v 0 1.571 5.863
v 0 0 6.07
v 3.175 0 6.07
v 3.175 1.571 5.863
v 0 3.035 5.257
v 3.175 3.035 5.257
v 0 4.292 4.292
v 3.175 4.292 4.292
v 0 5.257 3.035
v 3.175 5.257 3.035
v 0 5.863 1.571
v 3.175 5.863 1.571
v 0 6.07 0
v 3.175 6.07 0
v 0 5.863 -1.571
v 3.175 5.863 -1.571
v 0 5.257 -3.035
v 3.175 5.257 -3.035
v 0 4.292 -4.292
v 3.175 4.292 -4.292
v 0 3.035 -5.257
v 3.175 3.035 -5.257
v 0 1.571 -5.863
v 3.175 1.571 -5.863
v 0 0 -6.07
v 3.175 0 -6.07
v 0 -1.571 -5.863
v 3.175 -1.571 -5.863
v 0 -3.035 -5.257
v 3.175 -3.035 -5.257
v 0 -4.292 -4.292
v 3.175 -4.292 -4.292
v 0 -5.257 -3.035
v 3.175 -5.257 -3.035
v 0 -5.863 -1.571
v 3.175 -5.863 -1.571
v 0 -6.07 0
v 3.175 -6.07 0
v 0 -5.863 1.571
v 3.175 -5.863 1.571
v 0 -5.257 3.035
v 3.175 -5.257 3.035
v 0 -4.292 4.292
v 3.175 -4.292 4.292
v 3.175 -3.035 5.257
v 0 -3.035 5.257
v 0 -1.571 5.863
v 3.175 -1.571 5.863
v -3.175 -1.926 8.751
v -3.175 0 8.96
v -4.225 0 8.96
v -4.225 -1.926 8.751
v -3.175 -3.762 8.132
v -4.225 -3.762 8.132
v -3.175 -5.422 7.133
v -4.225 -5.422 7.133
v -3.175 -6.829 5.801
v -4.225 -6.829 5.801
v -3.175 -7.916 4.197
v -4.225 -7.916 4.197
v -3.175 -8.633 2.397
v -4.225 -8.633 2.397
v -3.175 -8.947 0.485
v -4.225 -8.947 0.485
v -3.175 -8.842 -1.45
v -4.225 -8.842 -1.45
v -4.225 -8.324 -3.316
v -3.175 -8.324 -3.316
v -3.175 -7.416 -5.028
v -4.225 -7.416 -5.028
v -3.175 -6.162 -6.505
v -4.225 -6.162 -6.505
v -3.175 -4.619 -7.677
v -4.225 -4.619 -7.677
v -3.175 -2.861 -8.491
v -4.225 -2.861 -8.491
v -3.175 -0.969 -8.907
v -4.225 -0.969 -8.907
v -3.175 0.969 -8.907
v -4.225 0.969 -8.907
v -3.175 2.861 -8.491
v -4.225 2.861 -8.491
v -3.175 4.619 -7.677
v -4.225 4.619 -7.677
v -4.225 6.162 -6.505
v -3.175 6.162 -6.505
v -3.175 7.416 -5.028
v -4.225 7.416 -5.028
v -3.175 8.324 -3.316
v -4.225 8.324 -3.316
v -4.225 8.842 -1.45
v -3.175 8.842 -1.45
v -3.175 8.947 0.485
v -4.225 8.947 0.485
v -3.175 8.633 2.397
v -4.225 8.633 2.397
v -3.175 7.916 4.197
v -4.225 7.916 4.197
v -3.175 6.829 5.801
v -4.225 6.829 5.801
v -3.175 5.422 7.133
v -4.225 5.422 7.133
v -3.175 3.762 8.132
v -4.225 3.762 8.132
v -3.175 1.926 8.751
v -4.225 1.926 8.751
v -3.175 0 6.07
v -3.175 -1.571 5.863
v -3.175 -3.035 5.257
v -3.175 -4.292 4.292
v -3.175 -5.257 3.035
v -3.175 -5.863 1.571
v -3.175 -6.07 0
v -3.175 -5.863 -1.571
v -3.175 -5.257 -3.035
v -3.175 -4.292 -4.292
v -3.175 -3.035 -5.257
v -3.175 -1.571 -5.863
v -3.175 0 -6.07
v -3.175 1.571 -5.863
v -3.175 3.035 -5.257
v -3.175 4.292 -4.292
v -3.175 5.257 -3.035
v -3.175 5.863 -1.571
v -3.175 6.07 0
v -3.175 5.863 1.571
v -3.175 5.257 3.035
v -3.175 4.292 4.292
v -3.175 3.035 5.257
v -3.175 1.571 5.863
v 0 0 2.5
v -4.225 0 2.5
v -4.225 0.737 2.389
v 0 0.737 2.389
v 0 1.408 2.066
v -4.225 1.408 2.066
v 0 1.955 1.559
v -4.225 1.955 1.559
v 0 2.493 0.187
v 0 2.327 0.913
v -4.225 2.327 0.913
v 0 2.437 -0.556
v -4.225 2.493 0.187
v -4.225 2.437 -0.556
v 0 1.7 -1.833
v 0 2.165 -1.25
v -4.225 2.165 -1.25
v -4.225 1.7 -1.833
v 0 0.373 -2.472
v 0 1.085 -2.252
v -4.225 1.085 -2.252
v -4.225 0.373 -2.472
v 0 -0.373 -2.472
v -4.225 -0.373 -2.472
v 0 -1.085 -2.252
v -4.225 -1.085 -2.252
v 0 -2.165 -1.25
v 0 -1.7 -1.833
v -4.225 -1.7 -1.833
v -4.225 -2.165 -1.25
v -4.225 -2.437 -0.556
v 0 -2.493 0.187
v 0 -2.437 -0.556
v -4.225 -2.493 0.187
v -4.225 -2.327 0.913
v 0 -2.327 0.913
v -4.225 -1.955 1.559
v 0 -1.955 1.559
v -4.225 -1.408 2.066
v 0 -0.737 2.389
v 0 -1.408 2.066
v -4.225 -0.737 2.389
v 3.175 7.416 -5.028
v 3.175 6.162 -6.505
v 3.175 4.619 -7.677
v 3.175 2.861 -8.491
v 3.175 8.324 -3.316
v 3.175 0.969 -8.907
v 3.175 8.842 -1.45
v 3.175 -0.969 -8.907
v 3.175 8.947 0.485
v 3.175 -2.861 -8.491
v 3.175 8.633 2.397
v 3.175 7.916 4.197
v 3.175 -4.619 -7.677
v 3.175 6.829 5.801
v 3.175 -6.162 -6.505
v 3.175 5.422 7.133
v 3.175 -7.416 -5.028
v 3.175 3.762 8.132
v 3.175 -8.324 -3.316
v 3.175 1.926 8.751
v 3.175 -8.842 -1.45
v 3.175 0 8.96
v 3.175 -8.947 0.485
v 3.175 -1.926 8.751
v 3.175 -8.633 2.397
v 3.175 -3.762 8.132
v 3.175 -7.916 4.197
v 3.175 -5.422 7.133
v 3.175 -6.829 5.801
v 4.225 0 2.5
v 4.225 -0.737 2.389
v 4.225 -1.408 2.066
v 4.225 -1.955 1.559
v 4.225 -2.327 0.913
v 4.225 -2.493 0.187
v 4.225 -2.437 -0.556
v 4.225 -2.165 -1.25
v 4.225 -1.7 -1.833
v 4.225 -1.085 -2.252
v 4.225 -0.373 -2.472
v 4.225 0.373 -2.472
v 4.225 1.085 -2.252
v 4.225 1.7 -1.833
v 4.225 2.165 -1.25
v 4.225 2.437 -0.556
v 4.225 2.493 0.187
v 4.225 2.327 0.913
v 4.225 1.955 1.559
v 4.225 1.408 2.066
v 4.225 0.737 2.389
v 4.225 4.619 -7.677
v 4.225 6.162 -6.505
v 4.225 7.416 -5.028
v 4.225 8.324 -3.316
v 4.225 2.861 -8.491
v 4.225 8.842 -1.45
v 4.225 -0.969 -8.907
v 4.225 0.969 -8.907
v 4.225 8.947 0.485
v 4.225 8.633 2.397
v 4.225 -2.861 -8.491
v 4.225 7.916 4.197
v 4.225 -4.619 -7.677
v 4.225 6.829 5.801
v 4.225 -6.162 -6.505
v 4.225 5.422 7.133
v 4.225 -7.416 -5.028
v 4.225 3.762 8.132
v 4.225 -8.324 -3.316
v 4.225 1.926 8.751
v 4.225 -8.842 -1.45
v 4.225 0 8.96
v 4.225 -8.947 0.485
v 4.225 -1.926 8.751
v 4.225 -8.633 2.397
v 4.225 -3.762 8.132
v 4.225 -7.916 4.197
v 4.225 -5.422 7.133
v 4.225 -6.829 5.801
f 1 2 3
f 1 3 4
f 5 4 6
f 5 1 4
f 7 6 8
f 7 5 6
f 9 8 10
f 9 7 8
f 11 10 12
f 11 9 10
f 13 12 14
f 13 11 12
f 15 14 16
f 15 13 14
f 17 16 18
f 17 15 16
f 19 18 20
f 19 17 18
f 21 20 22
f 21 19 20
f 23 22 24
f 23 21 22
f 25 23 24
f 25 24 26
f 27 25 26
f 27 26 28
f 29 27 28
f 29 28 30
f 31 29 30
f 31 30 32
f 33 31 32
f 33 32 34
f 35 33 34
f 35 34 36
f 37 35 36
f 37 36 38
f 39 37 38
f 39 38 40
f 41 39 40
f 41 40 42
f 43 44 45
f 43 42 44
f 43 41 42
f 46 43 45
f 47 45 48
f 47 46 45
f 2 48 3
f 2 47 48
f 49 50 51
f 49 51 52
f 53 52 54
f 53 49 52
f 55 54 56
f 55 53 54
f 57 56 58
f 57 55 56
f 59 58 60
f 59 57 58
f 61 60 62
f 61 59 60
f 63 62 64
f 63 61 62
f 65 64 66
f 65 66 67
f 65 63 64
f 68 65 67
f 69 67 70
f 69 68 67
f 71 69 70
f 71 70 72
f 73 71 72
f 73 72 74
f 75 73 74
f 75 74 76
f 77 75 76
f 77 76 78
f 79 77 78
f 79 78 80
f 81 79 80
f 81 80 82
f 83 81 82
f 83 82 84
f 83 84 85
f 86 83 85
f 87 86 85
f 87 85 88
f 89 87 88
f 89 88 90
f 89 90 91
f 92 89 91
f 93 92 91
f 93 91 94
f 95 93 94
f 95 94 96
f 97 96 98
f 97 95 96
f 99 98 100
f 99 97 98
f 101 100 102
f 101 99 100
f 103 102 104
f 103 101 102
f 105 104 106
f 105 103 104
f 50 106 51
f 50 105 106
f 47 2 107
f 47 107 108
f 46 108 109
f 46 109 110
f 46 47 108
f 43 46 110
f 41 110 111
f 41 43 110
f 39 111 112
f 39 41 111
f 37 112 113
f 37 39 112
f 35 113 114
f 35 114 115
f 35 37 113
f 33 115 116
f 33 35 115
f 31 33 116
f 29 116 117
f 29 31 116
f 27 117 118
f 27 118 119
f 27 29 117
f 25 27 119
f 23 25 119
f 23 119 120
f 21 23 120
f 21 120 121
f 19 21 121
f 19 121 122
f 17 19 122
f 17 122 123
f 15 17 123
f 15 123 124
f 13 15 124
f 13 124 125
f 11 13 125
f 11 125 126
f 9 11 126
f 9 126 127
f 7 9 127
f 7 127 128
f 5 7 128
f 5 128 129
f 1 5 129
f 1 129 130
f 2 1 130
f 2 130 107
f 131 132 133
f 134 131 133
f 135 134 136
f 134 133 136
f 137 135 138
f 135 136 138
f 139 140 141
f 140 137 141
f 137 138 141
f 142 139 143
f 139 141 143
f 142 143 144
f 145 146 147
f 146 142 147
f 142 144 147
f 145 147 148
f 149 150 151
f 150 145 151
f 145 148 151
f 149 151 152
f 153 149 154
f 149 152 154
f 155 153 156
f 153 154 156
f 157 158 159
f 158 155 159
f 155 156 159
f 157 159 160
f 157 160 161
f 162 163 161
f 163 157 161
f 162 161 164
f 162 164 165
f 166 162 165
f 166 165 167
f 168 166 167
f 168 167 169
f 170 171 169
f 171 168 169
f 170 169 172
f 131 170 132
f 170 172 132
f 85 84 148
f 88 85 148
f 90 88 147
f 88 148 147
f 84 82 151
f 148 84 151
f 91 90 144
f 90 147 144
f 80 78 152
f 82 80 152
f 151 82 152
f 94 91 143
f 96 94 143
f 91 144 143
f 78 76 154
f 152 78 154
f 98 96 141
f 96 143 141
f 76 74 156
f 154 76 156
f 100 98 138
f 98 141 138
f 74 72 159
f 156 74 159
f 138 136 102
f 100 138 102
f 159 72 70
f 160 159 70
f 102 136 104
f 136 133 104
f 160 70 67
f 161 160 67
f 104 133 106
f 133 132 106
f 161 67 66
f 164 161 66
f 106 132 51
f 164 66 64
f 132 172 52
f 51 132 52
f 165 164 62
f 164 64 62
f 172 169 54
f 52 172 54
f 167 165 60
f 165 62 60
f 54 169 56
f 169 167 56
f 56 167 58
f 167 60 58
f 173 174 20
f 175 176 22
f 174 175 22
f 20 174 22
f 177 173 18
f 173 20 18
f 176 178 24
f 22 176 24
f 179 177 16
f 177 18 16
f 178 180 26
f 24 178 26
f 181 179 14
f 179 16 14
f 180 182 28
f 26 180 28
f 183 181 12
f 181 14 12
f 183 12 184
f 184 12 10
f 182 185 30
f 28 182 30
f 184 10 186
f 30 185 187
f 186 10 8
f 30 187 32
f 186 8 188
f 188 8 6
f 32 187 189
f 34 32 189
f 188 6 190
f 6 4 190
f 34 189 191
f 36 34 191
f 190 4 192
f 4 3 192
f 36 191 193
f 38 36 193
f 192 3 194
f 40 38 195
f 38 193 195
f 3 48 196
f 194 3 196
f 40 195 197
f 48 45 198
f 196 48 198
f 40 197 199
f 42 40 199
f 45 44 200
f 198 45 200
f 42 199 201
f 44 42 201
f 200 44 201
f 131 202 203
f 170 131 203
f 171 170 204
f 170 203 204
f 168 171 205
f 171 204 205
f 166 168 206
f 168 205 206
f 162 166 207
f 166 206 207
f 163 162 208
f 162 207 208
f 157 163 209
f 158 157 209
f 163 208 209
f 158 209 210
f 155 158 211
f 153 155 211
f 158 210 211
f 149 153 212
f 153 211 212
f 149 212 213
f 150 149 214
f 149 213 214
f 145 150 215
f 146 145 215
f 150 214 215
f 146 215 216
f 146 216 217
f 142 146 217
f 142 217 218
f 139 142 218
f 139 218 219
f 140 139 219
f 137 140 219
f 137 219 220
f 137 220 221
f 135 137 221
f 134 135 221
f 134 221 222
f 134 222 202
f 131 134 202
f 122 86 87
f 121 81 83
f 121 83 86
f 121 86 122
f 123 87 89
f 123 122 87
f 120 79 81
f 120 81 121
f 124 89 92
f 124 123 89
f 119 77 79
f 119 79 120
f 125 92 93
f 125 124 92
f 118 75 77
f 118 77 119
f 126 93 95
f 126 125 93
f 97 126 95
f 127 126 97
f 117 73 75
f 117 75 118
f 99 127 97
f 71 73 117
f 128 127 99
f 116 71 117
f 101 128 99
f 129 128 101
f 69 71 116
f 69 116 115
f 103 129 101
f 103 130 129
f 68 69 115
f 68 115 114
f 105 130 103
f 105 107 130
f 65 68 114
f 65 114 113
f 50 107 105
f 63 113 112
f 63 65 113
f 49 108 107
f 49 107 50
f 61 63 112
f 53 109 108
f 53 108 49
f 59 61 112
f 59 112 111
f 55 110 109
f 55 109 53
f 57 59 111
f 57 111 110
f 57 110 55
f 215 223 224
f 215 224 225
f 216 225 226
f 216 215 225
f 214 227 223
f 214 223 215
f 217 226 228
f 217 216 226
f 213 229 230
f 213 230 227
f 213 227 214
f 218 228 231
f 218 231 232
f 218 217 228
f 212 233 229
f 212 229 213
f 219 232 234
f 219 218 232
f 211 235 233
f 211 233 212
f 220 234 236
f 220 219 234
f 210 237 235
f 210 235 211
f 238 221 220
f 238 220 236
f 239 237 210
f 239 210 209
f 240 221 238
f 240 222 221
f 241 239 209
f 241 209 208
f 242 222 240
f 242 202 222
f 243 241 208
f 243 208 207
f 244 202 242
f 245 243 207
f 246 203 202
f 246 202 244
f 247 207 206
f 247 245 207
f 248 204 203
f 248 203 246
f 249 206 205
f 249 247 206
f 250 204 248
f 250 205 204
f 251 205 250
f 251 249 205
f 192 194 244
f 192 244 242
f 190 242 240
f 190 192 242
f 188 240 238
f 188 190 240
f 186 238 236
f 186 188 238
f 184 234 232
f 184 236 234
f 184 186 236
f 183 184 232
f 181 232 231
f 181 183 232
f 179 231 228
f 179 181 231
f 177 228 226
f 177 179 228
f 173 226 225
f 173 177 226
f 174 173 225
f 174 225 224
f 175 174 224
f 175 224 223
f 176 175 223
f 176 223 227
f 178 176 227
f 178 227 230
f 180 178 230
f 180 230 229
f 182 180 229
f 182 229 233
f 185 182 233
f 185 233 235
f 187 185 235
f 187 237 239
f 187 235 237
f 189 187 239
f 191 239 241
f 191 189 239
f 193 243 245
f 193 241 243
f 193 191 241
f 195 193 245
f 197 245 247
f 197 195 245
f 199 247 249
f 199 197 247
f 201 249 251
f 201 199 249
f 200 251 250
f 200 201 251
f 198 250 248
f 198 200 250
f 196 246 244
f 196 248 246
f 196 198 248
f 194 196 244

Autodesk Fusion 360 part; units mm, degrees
sketch "Sketch1" plane through (0, 0, 0) normal (0, 1, 0) x (1, 0, 0)
  line L0 (0, 0) -> (0, -5) construction
  line L1 (0, -2.5) -> (4.225, -2.5)
  line L2 (4.225, -2.5) -> (4.225, -8.96)
  line L3 (4.225, -8.96) -> (3.175, -8.96)
  line L4 (3.175, -8.96) -> (3.175, -6.07)
  line L5 (3.175, -6.07) -> (0, -6.07)
  line L6 (-4.225, -8.96) -> (-3.175, -8.96)
  line L7 (-3.175, -8.96) -> (-3.175, -6.07)
  line L8 (-3.175, -6.07) -> (0, -6.07)
  line L9 (0, -2.5) -> (-4.225, -2.5)
  line L10 (-4.225, -2.5) -> (-4.225, -8.96)
  dimension "d1" = 4.225
  dimension "d2" = 1.05
  dimension "d3" = 2.5
  dimension "d4" = 6.07
  dimension "d5" = 8.96
revolve "Revolve1" add sketch "Sketch1" angle 360 about axis through (1.75, 0, 0) along (1, 0, 0)
ref_plane "WorkPlane1" through (0, 0, 0) normal (-1, 0, 0) x (0, 0, 1)
sketch "Sketch2" plane through (0, 0, 0) normal (-1, 0, 0) x (0, 1, 0)
equation "d1 = ( 8.45 / 2 ) * 1 mm"
equation "d5 = ( 17.92 / 2 ) * 1 mm"
